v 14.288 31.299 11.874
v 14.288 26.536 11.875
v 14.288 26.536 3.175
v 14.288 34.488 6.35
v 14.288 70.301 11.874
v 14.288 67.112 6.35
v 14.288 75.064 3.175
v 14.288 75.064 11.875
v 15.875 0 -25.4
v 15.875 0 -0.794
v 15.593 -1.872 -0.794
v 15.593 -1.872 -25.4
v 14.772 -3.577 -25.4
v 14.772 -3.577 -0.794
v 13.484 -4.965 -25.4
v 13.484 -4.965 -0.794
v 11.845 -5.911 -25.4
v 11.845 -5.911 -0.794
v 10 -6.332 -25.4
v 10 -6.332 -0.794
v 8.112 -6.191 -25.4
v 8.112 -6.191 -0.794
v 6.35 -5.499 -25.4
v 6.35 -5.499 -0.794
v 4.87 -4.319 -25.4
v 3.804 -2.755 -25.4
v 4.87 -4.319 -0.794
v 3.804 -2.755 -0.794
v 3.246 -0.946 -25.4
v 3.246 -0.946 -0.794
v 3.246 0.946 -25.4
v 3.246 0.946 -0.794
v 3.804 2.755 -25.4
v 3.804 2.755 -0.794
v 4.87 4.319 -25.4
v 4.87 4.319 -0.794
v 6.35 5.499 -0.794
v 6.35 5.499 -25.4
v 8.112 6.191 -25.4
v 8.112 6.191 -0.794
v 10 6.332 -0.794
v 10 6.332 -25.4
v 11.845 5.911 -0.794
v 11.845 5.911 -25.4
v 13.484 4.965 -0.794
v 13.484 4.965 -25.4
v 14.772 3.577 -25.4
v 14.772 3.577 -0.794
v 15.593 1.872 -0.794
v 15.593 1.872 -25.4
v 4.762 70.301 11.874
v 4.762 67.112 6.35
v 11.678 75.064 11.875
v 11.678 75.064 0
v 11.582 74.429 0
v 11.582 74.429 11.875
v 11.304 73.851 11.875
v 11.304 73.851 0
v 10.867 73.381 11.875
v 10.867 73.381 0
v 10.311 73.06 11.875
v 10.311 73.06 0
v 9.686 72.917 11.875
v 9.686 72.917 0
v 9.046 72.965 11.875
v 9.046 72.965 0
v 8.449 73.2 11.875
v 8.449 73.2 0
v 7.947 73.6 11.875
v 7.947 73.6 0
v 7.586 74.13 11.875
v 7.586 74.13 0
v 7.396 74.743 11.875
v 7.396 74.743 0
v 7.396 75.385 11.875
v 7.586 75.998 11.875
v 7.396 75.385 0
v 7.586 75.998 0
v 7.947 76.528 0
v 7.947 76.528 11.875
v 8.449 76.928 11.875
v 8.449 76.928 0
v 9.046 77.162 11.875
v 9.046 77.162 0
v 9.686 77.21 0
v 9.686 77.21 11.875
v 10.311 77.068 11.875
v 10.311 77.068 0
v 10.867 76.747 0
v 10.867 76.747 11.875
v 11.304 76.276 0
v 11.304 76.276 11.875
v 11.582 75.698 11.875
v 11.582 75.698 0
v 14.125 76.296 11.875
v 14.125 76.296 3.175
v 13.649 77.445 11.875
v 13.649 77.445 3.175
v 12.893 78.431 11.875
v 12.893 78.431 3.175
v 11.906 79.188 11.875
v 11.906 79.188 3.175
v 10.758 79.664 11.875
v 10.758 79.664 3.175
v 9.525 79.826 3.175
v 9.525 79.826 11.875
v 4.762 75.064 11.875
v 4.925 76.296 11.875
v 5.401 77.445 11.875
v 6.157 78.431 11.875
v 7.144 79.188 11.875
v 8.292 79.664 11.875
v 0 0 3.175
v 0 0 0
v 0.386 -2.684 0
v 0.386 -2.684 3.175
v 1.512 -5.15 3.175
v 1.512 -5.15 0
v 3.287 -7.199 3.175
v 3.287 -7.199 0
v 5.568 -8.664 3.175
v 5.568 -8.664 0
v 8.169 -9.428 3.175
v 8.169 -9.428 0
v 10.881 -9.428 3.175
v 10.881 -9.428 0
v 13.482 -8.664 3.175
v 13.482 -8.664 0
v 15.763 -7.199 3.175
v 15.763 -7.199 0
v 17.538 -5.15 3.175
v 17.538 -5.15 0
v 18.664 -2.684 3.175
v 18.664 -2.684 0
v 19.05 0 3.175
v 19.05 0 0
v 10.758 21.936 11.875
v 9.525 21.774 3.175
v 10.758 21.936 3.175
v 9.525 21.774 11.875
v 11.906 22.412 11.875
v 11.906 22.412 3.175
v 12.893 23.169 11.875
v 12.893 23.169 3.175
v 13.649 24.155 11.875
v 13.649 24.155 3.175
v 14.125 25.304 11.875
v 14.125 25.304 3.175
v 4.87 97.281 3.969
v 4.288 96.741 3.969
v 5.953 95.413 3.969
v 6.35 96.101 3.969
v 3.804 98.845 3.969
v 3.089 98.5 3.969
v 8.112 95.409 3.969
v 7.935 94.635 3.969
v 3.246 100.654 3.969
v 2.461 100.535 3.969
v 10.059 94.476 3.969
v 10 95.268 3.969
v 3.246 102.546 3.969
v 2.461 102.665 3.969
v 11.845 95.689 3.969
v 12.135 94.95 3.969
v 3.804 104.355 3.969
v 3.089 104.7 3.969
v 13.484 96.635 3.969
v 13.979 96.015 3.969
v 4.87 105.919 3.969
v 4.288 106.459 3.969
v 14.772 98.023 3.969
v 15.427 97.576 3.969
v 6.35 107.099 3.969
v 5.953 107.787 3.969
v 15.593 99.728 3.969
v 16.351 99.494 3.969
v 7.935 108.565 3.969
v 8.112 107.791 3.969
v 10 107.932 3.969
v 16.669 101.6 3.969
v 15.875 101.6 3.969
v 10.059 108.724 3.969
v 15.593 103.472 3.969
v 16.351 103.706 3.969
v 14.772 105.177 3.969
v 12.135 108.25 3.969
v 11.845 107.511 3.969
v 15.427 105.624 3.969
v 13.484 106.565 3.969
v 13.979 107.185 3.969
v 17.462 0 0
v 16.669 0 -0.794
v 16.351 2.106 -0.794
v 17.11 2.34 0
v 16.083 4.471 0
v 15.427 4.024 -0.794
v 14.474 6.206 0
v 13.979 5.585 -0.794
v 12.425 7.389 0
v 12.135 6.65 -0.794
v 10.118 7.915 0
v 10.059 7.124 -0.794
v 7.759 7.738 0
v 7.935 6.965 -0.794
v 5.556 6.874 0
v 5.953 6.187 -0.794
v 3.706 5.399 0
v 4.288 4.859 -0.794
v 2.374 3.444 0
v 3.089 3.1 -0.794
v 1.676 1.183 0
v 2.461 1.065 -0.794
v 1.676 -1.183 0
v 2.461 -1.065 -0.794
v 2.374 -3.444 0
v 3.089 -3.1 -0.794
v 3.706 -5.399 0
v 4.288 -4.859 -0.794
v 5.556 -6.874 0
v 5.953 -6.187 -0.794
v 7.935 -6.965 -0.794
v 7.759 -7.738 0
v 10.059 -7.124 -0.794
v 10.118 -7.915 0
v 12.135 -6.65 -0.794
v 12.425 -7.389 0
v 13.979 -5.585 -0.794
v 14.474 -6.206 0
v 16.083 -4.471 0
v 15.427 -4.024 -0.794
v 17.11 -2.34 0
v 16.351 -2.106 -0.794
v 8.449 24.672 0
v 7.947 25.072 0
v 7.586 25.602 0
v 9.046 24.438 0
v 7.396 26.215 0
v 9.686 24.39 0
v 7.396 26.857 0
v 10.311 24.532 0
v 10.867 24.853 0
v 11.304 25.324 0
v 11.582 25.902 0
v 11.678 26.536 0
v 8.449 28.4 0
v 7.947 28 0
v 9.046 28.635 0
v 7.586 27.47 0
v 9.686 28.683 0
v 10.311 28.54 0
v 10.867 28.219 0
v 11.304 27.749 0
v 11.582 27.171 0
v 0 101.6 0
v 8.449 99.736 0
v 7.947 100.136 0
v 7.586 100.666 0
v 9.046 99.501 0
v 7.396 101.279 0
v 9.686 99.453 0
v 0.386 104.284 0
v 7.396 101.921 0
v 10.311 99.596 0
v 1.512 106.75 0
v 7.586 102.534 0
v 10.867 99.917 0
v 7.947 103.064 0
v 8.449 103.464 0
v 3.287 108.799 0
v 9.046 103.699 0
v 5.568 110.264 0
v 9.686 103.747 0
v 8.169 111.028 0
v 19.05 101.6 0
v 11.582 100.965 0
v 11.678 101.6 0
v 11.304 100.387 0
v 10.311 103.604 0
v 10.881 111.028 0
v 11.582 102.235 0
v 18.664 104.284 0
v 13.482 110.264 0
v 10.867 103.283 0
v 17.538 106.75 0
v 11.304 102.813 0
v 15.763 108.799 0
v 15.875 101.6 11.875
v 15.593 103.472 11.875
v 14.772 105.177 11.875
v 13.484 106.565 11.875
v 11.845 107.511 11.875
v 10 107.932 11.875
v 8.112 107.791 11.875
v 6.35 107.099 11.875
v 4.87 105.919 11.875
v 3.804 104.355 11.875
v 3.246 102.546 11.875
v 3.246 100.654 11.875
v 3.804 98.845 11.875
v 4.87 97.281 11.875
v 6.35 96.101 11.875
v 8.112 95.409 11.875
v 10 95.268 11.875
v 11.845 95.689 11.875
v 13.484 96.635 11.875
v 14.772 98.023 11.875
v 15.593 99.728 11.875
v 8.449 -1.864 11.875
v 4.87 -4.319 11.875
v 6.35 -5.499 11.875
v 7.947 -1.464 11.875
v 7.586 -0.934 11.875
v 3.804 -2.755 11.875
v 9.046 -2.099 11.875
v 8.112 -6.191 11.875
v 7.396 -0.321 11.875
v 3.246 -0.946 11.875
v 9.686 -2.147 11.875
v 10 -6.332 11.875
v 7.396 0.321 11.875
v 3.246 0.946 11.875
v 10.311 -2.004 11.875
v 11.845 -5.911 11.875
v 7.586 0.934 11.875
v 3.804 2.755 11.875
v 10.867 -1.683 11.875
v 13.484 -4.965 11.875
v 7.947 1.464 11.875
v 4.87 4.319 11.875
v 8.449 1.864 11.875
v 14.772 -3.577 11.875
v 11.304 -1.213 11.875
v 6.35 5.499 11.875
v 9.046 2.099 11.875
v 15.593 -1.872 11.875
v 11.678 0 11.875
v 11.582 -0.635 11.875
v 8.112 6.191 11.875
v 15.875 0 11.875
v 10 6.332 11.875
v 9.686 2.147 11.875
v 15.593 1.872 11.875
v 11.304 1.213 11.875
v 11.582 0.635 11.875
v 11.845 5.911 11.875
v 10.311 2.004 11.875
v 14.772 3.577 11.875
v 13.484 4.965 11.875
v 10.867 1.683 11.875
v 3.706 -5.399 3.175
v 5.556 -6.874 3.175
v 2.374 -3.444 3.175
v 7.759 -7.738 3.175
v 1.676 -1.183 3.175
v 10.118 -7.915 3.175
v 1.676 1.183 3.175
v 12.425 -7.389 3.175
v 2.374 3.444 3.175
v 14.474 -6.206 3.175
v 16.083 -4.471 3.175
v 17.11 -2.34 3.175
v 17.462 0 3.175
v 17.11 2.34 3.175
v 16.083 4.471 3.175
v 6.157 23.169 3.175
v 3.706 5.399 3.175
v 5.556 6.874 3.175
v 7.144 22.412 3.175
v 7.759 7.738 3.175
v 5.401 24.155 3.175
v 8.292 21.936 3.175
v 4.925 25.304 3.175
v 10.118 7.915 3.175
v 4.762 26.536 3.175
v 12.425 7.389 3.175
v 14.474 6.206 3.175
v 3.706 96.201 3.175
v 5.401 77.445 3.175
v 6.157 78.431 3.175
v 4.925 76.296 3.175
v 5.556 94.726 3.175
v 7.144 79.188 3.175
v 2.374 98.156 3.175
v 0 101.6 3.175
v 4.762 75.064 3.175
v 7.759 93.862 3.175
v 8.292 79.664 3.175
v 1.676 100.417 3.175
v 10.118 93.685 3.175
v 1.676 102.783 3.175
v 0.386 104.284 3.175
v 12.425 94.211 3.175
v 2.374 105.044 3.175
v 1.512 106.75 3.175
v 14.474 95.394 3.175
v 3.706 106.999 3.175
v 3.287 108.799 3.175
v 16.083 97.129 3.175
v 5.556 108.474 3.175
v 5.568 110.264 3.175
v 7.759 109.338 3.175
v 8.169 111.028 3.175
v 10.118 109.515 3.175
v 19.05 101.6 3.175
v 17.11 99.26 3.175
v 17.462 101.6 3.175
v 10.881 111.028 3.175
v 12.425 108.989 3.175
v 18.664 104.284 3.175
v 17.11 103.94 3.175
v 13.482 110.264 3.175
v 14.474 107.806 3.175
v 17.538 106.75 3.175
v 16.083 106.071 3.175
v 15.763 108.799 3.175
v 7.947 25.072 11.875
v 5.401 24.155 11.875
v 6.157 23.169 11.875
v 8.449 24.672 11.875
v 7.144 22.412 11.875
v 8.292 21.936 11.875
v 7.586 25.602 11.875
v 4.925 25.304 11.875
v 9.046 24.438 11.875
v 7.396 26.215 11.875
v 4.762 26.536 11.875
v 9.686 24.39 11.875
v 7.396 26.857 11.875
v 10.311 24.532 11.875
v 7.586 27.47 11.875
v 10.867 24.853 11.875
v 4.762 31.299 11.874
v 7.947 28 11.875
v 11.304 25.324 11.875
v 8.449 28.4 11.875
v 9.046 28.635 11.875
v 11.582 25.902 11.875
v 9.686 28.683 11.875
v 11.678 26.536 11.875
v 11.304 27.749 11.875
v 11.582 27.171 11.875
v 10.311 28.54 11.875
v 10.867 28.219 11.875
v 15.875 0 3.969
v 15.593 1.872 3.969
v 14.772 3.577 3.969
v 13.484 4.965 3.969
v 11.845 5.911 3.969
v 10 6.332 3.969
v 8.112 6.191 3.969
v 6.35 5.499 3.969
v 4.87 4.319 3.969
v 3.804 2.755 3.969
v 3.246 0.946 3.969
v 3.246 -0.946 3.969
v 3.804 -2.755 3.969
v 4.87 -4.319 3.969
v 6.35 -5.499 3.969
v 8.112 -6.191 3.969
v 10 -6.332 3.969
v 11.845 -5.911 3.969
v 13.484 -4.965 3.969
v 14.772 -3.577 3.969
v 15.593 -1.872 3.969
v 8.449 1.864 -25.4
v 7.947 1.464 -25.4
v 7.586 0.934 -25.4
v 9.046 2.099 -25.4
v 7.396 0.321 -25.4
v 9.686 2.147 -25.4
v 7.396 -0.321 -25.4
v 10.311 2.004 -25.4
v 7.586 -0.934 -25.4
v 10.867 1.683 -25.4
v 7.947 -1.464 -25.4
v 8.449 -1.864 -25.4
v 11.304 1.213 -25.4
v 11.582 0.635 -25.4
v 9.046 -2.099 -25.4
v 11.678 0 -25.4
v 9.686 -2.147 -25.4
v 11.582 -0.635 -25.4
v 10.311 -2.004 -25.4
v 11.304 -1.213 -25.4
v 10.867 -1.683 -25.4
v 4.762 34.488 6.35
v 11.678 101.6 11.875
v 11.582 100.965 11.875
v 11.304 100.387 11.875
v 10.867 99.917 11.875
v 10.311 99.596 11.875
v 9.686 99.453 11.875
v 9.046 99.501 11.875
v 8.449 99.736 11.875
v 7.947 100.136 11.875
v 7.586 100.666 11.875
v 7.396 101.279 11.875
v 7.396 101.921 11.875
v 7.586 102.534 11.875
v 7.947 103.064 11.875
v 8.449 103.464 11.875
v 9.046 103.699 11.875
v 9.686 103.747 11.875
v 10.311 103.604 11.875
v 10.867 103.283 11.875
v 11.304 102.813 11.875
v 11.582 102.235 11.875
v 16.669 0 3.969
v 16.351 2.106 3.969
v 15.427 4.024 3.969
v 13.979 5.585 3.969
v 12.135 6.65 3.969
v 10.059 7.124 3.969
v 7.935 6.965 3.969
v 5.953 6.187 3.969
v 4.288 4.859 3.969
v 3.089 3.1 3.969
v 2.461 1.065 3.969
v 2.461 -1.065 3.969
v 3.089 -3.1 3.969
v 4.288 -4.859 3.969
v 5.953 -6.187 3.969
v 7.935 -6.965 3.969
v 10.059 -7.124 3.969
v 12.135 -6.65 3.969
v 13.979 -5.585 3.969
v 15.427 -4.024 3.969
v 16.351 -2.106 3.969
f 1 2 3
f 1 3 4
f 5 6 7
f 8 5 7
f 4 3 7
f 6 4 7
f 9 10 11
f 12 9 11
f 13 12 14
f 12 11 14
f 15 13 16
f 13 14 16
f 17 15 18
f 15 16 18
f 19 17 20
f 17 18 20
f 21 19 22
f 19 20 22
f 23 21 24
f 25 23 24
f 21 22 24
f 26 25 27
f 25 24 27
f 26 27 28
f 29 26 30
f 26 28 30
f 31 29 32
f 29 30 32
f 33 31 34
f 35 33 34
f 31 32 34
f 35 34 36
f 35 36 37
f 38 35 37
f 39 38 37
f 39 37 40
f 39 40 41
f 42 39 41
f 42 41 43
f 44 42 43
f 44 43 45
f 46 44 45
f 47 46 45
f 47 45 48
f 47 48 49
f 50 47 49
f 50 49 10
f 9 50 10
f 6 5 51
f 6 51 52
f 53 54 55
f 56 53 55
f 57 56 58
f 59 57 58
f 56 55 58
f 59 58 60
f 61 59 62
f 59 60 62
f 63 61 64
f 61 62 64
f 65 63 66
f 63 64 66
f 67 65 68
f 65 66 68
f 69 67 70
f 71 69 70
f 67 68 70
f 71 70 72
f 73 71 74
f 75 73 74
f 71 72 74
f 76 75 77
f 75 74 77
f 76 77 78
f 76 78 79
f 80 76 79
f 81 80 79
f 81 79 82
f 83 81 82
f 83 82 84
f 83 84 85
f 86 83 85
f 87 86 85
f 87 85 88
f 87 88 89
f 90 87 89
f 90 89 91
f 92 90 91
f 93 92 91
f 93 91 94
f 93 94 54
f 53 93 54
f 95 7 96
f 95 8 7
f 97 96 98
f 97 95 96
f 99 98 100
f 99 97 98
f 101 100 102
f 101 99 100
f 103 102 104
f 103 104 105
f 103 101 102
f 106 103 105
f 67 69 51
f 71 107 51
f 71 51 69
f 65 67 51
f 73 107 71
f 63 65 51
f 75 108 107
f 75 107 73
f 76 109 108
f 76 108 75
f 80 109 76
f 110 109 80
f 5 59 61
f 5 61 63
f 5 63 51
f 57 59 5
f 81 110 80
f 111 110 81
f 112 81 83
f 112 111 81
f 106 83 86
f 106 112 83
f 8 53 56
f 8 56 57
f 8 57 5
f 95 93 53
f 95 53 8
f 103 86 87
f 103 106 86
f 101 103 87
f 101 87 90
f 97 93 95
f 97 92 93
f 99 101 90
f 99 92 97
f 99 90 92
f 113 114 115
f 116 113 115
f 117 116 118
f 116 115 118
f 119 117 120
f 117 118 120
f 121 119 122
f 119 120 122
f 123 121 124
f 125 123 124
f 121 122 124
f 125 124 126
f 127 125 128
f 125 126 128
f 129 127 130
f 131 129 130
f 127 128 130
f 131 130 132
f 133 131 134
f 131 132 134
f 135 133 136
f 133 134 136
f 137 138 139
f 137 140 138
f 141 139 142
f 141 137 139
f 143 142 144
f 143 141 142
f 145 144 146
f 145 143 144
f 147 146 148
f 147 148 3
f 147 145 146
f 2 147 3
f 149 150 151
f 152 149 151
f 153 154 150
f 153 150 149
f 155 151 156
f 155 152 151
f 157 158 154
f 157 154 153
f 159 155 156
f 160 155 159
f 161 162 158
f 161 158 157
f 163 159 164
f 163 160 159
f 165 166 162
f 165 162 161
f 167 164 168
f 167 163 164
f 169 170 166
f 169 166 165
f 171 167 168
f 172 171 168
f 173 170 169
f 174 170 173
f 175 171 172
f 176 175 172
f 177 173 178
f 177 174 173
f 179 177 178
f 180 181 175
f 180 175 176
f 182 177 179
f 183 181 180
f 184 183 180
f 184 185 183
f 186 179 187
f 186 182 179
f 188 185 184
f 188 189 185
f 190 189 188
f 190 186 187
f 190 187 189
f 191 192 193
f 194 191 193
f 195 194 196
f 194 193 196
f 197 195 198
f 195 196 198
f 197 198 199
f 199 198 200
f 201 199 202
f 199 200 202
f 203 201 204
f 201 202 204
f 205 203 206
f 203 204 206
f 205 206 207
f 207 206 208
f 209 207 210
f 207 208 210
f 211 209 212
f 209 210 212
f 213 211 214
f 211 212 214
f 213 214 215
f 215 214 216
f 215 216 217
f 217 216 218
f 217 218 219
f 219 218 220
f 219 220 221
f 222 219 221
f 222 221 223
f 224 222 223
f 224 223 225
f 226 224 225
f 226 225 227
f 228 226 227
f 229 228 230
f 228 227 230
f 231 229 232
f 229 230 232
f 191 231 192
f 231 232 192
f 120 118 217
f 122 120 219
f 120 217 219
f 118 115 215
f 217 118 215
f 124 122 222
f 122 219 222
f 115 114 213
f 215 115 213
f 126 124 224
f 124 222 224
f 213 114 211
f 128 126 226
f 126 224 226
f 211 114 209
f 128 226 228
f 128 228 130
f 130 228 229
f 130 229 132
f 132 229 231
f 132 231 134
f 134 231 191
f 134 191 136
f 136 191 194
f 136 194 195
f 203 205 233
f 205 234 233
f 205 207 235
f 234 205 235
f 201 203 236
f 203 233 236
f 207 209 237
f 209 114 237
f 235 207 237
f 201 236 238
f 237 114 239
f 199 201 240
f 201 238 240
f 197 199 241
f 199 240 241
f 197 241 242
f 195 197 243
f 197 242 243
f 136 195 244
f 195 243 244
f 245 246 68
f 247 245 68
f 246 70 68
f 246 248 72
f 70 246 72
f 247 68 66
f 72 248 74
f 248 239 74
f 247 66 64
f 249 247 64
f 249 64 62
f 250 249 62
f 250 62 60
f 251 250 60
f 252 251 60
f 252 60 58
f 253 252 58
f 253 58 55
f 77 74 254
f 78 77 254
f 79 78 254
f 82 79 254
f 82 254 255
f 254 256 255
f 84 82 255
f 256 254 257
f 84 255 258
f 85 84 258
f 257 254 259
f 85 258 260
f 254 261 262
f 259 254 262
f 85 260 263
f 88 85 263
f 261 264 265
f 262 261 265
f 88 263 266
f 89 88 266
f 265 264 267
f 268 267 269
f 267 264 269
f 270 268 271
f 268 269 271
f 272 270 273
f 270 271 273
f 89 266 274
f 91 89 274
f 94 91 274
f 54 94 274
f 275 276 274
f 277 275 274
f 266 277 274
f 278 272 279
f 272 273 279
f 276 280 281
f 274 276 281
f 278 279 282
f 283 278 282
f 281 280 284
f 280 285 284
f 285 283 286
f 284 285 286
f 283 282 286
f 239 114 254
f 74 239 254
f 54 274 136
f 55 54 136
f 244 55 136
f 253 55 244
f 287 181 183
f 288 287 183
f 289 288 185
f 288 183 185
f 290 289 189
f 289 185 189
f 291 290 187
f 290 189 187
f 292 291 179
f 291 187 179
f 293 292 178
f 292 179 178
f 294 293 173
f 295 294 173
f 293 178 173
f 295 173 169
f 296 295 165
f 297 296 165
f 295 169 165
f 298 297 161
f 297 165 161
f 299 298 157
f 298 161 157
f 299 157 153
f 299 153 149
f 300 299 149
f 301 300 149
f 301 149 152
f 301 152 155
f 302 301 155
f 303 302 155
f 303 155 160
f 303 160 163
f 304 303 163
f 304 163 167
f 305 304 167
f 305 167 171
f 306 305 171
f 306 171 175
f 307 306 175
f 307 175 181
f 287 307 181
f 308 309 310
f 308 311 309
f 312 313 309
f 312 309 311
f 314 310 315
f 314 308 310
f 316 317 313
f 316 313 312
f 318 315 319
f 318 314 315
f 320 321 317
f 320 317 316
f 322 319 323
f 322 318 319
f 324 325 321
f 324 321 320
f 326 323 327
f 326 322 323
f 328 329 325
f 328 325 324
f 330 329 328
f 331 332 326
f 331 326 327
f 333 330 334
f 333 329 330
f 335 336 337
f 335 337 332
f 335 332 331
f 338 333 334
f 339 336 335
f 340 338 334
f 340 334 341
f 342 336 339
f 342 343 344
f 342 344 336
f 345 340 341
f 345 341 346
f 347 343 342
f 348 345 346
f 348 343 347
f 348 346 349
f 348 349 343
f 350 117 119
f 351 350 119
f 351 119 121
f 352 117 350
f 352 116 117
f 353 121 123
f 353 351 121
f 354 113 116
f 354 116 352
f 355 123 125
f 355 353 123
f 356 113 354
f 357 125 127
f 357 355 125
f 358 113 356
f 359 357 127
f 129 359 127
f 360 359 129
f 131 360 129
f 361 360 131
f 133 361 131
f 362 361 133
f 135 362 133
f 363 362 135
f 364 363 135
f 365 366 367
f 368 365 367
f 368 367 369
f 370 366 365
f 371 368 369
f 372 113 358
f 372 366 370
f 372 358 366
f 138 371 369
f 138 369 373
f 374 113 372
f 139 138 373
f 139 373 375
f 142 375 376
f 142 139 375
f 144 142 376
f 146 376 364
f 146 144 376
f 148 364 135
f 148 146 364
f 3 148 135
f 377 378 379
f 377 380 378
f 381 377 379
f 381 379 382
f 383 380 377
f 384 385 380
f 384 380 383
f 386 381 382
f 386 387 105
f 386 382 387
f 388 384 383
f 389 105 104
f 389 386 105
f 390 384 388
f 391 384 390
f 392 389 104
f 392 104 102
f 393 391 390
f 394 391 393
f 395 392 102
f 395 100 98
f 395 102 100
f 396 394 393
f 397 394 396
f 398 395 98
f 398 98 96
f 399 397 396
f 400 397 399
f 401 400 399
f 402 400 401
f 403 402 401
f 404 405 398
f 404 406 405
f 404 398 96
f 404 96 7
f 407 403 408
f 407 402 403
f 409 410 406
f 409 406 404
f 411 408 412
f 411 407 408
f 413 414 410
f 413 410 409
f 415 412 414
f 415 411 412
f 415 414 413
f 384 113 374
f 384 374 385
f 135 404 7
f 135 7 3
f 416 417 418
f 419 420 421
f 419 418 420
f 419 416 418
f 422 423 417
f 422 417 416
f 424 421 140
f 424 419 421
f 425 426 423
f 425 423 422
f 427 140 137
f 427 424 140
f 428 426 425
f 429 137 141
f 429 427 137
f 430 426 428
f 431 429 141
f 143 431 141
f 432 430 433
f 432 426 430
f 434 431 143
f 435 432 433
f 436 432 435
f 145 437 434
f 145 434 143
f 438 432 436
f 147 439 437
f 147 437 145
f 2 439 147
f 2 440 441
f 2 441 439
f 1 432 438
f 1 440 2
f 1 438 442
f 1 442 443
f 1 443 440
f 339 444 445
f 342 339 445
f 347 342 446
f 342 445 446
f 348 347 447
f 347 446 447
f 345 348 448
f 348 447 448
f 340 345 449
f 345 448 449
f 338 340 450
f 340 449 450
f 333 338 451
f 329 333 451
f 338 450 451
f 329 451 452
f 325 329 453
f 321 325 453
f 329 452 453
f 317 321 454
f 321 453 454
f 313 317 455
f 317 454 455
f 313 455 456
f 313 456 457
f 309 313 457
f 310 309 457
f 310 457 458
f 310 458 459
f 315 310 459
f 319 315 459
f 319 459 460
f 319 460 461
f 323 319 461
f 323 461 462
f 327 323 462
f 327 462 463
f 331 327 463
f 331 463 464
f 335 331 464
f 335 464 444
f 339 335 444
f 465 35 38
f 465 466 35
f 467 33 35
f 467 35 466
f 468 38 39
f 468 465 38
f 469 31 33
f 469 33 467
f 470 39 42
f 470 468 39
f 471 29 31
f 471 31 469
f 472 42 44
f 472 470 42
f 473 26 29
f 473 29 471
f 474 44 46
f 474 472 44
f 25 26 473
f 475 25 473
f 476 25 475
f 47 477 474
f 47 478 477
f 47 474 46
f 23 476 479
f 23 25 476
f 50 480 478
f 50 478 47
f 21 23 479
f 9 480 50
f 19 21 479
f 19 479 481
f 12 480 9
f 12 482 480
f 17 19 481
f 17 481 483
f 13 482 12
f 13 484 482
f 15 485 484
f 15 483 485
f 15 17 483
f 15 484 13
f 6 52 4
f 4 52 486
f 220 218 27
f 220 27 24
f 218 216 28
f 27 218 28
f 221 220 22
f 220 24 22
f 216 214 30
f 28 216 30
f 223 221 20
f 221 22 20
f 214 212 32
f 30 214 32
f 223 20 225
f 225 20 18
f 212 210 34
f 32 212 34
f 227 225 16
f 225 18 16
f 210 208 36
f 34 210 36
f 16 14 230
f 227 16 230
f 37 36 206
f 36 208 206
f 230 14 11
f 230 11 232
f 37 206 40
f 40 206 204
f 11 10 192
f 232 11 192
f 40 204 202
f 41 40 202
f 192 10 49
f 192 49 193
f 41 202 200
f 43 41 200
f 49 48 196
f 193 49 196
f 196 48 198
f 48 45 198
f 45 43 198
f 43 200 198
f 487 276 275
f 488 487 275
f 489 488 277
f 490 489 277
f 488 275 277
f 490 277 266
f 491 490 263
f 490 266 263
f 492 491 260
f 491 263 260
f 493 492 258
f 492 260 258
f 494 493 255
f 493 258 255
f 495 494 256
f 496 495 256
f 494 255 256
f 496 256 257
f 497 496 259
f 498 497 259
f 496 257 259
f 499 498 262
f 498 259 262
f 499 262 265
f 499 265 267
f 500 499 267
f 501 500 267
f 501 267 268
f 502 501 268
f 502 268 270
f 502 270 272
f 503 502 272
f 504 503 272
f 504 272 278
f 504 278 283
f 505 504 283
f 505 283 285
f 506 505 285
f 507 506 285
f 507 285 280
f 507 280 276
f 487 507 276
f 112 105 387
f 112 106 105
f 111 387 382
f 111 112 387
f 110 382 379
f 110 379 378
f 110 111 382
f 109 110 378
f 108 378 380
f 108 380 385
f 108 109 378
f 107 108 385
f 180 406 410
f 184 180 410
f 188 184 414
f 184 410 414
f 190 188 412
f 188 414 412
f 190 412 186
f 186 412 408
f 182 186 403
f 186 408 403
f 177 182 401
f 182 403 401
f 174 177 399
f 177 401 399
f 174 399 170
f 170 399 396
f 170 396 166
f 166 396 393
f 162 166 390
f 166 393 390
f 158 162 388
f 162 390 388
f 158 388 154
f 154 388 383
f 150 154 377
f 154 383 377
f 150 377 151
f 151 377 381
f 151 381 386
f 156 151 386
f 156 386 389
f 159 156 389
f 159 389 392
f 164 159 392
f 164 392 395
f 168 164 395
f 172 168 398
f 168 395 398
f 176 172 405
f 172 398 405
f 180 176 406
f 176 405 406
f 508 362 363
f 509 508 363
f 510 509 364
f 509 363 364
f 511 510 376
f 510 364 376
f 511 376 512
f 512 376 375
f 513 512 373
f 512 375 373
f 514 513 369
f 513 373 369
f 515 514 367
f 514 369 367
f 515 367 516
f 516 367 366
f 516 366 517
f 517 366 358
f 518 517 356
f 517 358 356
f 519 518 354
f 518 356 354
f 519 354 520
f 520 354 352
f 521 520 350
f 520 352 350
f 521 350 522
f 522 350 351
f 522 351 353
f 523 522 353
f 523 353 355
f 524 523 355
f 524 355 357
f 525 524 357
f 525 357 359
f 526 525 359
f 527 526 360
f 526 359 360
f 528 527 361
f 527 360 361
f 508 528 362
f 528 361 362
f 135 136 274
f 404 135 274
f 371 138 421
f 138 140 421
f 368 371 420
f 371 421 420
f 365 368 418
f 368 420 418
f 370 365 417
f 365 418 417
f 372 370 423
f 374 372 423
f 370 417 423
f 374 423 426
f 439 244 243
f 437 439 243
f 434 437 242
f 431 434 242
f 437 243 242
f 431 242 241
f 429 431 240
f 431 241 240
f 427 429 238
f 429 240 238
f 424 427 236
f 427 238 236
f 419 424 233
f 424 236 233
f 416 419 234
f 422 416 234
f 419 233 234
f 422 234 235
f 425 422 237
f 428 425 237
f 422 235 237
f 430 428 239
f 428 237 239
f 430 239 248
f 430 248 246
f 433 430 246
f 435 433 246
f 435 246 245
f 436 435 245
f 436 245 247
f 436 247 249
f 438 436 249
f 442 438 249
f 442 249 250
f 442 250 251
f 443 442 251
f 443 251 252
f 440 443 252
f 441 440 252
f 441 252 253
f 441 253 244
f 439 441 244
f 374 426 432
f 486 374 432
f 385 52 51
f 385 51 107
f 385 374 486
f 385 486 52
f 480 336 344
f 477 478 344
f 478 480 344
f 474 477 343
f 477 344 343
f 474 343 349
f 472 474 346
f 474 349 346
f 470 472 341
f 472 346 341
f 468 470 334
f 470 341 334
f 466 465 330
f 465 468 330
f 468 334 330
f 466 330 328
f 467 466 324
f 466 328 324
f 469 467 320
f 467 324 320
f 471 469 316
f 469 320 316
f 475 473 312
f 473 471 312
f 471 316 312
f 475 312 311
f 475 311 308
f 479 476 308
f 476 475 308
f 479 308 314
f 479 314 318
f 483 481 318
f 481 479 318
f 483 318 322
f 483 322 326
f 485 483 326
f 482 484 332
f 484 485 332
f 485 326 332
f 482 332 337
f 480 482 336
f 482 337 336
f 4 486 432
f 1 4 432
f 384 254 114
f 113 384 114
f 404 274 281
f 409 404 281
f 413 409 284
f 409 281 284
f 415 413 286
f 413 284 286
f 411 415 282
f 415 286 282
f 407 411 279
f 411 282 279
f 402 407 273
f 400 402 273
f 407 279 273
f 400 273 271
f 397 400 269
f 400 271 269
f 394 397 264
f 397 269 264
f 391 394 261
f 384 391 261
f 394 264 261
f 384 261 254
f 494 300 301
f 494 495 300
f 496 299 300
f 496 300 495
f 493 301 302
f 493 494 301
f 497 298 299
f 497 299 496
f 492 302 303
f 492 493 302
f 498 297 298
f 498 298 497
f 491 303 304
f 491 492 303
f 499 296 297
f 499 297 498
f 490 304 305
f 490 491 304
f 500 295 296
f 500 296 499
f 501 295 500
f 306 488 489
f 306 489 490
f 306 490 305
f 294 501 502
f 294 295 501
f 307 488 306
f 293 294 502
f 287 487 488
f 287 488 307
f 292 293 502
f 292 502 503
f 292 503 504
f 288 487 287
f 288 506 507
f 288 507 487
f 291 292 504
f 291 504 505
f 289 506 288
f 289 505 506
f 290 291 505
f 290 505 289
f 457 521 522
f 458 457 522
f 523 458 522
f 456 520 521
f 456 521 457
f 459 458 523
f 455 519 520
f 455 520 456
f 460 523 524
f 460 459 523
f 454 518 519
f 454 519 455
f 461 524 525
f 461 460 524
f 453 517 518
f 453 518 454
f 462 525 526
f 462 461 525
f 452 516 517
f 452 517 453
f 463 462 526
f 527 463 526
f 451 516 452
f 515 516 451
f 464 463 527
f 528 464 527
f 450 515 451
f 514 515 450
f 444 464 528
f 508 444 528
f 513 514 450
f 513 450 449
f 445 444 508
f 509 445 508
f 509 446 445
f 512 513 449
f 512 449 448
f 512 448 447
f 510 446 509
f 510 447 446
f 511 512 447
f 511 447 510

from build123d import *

# Parameters (mm, degrees)
F1_DEPTH       = 3.175
F2_W           = 9.525
F2_H           = 58.0526056528
F2_R           = 6.35
F3_DEPTH       = 8.6995
F5_DEPTH       = 9.525
F6_R           = 4.76249
F7_R           = 6.35
F8_DEPTH       = 25.4
F9_R           = 2.15265
F10_DEPTH      = 37.2745
F11_R          = 7.14375
F11_R_2        = 2.15265
F12_DEPTH      = 0.79375
F12_DEPTH_BACK = 3.96875
F13_R          = 7.14375
F13_R_2        = 2.15265
F14_DEPTH      = 0.79375
F15_SIZE       = 0.79374


# Not quite as in the source:
# - a fillet or chamfer is up to 0.001 mm smaller than in the source, because OpenCascade refuses the exact size


with BuildPart() as f1:
    # F0 (on Top) → F1 (new body)
    with BuildSketch(Plane.XY):
        with BuildLine():
            Line((0, 101.6), (0, 0))
            ThreePointArc((0, 0), (9.525, -9.525), (19.05, 0))
            Line((19.05, 0), (19.05, 101.6))
            ThreePointArc((19.05, 101.6), (9.525, 111.125), (0, 101.6))
        make_face()
    extrude(amount=F1_DEPTH)

    # F2 (on face) → F3 (join)
    with BuildSketch(Plane.XY.offset(3.175)):
        with Locations((9.525, 50.8)):
            Rectangle(F2_W, F2_H)
        with Locations((9.525, 0)):
            Circle(F2_R)
        with Locations((9.525, 101.6)):
            Circle(F2_R)
    extrude(amount=F3_DEPTH)

    # F4 (on face) → F5 (cut, through all)
    with BuildSketch(Plane(origin=(4.7625, 0, 0), x_dir=(0, -1, 0), z_dir=(-1, 0, 0))):
        Polygon((-34.4882687357, 6.35), (-31.2986971736, 11.8745), (-70.3013028264, 11.8745), (-67.1117312643, 6.35), align=None)
    extrude(amount=-F5_DEPTH, mode=Mode.SUBTRACT)

    # F6 (radius 4.7625 in the source; OpenCascade refuses exactly that, so slightly less here)
    f6_edges = [f1.edges().sort_by_distance(p)[0] for p in [
        (4.7625, 79.826303, 7.52475),
        (14.2875, 79.826303, 7.52475),
        (4.7625, 21.773697, 7.52475),
        (14.2875, 21.773697, 7.52475),
    ]]
    fillet(f6_edges, radius=F6_R)

    # F7 (on face) → F8 (join)
    with BuildSketch(Plane(origin=(0, 0, 0), x_dir=(1, 0, 0), z_dir=(0, 0, -1))):
        with Locations((9.525, 0)):
            Circle(F7_R)
    extrude(amount=F8_DEPTH)

    # F9 (on face) → F10 (cut, through all)
    with BuildSketch(Plane(origin=(0, 0, -25.4), x_dir=(1, 0, 0), z_dir=(0, 0, -1))):
        with Locations((9.525, 0)):
            Circle(F9_R)
        with Locations((9.525, -26.5361971736)):
            Circle(F9_R)
        with Locations((9.525, -75.0638028264)):
            Circle(F9_R)
        with Locations((9.525, -101.6)):
            Circle(F9_R)
    extrude(amount=-F10_DEPTH, mode=Mode.SUBTRACT)

    # F11 (on face) → F12 (join, two sides)
    with BuildSketch(Plane.XY.offset(3.175)) as f12_sk:
        with Locations((9.525, 0)):
            Circle(F11_R)
        with Locations((9.525, 0)):
            Circle(F11_R_2, mode=Mode.SUBTRACT)
    extrude(amount=F12_DEPTH)
    extrude(f12_sk.sketch, amount=-F12_DEPTH_BACK)

    # F13 (on face) → F14 (join, through all)
    with BuildSketch(Plane.XY.offset(3.175)):
        with Locations((9.525, 101.6)):
            Circle(F13_R)
        with Locations((9.525, 101.6)):
            Circle(F13_R_2, mode=Mode.SUBTRACT)
    extrude(amount=F14_DEPTH)

    # F15 (size 0.79375 in the source; OpenCascade refuses exactly that, so slightly less here)
    f15_edges = [f1.edges().sort_by_distance(p)[0] for p in [
        (2.38125, 101.6, 3.175),
        (2.38125, 0, 0),
        (2.38125, 0, 3.175),
    ]]
    chamfer(f15_edges, length=F15_SIZE)


solid = f1.part
